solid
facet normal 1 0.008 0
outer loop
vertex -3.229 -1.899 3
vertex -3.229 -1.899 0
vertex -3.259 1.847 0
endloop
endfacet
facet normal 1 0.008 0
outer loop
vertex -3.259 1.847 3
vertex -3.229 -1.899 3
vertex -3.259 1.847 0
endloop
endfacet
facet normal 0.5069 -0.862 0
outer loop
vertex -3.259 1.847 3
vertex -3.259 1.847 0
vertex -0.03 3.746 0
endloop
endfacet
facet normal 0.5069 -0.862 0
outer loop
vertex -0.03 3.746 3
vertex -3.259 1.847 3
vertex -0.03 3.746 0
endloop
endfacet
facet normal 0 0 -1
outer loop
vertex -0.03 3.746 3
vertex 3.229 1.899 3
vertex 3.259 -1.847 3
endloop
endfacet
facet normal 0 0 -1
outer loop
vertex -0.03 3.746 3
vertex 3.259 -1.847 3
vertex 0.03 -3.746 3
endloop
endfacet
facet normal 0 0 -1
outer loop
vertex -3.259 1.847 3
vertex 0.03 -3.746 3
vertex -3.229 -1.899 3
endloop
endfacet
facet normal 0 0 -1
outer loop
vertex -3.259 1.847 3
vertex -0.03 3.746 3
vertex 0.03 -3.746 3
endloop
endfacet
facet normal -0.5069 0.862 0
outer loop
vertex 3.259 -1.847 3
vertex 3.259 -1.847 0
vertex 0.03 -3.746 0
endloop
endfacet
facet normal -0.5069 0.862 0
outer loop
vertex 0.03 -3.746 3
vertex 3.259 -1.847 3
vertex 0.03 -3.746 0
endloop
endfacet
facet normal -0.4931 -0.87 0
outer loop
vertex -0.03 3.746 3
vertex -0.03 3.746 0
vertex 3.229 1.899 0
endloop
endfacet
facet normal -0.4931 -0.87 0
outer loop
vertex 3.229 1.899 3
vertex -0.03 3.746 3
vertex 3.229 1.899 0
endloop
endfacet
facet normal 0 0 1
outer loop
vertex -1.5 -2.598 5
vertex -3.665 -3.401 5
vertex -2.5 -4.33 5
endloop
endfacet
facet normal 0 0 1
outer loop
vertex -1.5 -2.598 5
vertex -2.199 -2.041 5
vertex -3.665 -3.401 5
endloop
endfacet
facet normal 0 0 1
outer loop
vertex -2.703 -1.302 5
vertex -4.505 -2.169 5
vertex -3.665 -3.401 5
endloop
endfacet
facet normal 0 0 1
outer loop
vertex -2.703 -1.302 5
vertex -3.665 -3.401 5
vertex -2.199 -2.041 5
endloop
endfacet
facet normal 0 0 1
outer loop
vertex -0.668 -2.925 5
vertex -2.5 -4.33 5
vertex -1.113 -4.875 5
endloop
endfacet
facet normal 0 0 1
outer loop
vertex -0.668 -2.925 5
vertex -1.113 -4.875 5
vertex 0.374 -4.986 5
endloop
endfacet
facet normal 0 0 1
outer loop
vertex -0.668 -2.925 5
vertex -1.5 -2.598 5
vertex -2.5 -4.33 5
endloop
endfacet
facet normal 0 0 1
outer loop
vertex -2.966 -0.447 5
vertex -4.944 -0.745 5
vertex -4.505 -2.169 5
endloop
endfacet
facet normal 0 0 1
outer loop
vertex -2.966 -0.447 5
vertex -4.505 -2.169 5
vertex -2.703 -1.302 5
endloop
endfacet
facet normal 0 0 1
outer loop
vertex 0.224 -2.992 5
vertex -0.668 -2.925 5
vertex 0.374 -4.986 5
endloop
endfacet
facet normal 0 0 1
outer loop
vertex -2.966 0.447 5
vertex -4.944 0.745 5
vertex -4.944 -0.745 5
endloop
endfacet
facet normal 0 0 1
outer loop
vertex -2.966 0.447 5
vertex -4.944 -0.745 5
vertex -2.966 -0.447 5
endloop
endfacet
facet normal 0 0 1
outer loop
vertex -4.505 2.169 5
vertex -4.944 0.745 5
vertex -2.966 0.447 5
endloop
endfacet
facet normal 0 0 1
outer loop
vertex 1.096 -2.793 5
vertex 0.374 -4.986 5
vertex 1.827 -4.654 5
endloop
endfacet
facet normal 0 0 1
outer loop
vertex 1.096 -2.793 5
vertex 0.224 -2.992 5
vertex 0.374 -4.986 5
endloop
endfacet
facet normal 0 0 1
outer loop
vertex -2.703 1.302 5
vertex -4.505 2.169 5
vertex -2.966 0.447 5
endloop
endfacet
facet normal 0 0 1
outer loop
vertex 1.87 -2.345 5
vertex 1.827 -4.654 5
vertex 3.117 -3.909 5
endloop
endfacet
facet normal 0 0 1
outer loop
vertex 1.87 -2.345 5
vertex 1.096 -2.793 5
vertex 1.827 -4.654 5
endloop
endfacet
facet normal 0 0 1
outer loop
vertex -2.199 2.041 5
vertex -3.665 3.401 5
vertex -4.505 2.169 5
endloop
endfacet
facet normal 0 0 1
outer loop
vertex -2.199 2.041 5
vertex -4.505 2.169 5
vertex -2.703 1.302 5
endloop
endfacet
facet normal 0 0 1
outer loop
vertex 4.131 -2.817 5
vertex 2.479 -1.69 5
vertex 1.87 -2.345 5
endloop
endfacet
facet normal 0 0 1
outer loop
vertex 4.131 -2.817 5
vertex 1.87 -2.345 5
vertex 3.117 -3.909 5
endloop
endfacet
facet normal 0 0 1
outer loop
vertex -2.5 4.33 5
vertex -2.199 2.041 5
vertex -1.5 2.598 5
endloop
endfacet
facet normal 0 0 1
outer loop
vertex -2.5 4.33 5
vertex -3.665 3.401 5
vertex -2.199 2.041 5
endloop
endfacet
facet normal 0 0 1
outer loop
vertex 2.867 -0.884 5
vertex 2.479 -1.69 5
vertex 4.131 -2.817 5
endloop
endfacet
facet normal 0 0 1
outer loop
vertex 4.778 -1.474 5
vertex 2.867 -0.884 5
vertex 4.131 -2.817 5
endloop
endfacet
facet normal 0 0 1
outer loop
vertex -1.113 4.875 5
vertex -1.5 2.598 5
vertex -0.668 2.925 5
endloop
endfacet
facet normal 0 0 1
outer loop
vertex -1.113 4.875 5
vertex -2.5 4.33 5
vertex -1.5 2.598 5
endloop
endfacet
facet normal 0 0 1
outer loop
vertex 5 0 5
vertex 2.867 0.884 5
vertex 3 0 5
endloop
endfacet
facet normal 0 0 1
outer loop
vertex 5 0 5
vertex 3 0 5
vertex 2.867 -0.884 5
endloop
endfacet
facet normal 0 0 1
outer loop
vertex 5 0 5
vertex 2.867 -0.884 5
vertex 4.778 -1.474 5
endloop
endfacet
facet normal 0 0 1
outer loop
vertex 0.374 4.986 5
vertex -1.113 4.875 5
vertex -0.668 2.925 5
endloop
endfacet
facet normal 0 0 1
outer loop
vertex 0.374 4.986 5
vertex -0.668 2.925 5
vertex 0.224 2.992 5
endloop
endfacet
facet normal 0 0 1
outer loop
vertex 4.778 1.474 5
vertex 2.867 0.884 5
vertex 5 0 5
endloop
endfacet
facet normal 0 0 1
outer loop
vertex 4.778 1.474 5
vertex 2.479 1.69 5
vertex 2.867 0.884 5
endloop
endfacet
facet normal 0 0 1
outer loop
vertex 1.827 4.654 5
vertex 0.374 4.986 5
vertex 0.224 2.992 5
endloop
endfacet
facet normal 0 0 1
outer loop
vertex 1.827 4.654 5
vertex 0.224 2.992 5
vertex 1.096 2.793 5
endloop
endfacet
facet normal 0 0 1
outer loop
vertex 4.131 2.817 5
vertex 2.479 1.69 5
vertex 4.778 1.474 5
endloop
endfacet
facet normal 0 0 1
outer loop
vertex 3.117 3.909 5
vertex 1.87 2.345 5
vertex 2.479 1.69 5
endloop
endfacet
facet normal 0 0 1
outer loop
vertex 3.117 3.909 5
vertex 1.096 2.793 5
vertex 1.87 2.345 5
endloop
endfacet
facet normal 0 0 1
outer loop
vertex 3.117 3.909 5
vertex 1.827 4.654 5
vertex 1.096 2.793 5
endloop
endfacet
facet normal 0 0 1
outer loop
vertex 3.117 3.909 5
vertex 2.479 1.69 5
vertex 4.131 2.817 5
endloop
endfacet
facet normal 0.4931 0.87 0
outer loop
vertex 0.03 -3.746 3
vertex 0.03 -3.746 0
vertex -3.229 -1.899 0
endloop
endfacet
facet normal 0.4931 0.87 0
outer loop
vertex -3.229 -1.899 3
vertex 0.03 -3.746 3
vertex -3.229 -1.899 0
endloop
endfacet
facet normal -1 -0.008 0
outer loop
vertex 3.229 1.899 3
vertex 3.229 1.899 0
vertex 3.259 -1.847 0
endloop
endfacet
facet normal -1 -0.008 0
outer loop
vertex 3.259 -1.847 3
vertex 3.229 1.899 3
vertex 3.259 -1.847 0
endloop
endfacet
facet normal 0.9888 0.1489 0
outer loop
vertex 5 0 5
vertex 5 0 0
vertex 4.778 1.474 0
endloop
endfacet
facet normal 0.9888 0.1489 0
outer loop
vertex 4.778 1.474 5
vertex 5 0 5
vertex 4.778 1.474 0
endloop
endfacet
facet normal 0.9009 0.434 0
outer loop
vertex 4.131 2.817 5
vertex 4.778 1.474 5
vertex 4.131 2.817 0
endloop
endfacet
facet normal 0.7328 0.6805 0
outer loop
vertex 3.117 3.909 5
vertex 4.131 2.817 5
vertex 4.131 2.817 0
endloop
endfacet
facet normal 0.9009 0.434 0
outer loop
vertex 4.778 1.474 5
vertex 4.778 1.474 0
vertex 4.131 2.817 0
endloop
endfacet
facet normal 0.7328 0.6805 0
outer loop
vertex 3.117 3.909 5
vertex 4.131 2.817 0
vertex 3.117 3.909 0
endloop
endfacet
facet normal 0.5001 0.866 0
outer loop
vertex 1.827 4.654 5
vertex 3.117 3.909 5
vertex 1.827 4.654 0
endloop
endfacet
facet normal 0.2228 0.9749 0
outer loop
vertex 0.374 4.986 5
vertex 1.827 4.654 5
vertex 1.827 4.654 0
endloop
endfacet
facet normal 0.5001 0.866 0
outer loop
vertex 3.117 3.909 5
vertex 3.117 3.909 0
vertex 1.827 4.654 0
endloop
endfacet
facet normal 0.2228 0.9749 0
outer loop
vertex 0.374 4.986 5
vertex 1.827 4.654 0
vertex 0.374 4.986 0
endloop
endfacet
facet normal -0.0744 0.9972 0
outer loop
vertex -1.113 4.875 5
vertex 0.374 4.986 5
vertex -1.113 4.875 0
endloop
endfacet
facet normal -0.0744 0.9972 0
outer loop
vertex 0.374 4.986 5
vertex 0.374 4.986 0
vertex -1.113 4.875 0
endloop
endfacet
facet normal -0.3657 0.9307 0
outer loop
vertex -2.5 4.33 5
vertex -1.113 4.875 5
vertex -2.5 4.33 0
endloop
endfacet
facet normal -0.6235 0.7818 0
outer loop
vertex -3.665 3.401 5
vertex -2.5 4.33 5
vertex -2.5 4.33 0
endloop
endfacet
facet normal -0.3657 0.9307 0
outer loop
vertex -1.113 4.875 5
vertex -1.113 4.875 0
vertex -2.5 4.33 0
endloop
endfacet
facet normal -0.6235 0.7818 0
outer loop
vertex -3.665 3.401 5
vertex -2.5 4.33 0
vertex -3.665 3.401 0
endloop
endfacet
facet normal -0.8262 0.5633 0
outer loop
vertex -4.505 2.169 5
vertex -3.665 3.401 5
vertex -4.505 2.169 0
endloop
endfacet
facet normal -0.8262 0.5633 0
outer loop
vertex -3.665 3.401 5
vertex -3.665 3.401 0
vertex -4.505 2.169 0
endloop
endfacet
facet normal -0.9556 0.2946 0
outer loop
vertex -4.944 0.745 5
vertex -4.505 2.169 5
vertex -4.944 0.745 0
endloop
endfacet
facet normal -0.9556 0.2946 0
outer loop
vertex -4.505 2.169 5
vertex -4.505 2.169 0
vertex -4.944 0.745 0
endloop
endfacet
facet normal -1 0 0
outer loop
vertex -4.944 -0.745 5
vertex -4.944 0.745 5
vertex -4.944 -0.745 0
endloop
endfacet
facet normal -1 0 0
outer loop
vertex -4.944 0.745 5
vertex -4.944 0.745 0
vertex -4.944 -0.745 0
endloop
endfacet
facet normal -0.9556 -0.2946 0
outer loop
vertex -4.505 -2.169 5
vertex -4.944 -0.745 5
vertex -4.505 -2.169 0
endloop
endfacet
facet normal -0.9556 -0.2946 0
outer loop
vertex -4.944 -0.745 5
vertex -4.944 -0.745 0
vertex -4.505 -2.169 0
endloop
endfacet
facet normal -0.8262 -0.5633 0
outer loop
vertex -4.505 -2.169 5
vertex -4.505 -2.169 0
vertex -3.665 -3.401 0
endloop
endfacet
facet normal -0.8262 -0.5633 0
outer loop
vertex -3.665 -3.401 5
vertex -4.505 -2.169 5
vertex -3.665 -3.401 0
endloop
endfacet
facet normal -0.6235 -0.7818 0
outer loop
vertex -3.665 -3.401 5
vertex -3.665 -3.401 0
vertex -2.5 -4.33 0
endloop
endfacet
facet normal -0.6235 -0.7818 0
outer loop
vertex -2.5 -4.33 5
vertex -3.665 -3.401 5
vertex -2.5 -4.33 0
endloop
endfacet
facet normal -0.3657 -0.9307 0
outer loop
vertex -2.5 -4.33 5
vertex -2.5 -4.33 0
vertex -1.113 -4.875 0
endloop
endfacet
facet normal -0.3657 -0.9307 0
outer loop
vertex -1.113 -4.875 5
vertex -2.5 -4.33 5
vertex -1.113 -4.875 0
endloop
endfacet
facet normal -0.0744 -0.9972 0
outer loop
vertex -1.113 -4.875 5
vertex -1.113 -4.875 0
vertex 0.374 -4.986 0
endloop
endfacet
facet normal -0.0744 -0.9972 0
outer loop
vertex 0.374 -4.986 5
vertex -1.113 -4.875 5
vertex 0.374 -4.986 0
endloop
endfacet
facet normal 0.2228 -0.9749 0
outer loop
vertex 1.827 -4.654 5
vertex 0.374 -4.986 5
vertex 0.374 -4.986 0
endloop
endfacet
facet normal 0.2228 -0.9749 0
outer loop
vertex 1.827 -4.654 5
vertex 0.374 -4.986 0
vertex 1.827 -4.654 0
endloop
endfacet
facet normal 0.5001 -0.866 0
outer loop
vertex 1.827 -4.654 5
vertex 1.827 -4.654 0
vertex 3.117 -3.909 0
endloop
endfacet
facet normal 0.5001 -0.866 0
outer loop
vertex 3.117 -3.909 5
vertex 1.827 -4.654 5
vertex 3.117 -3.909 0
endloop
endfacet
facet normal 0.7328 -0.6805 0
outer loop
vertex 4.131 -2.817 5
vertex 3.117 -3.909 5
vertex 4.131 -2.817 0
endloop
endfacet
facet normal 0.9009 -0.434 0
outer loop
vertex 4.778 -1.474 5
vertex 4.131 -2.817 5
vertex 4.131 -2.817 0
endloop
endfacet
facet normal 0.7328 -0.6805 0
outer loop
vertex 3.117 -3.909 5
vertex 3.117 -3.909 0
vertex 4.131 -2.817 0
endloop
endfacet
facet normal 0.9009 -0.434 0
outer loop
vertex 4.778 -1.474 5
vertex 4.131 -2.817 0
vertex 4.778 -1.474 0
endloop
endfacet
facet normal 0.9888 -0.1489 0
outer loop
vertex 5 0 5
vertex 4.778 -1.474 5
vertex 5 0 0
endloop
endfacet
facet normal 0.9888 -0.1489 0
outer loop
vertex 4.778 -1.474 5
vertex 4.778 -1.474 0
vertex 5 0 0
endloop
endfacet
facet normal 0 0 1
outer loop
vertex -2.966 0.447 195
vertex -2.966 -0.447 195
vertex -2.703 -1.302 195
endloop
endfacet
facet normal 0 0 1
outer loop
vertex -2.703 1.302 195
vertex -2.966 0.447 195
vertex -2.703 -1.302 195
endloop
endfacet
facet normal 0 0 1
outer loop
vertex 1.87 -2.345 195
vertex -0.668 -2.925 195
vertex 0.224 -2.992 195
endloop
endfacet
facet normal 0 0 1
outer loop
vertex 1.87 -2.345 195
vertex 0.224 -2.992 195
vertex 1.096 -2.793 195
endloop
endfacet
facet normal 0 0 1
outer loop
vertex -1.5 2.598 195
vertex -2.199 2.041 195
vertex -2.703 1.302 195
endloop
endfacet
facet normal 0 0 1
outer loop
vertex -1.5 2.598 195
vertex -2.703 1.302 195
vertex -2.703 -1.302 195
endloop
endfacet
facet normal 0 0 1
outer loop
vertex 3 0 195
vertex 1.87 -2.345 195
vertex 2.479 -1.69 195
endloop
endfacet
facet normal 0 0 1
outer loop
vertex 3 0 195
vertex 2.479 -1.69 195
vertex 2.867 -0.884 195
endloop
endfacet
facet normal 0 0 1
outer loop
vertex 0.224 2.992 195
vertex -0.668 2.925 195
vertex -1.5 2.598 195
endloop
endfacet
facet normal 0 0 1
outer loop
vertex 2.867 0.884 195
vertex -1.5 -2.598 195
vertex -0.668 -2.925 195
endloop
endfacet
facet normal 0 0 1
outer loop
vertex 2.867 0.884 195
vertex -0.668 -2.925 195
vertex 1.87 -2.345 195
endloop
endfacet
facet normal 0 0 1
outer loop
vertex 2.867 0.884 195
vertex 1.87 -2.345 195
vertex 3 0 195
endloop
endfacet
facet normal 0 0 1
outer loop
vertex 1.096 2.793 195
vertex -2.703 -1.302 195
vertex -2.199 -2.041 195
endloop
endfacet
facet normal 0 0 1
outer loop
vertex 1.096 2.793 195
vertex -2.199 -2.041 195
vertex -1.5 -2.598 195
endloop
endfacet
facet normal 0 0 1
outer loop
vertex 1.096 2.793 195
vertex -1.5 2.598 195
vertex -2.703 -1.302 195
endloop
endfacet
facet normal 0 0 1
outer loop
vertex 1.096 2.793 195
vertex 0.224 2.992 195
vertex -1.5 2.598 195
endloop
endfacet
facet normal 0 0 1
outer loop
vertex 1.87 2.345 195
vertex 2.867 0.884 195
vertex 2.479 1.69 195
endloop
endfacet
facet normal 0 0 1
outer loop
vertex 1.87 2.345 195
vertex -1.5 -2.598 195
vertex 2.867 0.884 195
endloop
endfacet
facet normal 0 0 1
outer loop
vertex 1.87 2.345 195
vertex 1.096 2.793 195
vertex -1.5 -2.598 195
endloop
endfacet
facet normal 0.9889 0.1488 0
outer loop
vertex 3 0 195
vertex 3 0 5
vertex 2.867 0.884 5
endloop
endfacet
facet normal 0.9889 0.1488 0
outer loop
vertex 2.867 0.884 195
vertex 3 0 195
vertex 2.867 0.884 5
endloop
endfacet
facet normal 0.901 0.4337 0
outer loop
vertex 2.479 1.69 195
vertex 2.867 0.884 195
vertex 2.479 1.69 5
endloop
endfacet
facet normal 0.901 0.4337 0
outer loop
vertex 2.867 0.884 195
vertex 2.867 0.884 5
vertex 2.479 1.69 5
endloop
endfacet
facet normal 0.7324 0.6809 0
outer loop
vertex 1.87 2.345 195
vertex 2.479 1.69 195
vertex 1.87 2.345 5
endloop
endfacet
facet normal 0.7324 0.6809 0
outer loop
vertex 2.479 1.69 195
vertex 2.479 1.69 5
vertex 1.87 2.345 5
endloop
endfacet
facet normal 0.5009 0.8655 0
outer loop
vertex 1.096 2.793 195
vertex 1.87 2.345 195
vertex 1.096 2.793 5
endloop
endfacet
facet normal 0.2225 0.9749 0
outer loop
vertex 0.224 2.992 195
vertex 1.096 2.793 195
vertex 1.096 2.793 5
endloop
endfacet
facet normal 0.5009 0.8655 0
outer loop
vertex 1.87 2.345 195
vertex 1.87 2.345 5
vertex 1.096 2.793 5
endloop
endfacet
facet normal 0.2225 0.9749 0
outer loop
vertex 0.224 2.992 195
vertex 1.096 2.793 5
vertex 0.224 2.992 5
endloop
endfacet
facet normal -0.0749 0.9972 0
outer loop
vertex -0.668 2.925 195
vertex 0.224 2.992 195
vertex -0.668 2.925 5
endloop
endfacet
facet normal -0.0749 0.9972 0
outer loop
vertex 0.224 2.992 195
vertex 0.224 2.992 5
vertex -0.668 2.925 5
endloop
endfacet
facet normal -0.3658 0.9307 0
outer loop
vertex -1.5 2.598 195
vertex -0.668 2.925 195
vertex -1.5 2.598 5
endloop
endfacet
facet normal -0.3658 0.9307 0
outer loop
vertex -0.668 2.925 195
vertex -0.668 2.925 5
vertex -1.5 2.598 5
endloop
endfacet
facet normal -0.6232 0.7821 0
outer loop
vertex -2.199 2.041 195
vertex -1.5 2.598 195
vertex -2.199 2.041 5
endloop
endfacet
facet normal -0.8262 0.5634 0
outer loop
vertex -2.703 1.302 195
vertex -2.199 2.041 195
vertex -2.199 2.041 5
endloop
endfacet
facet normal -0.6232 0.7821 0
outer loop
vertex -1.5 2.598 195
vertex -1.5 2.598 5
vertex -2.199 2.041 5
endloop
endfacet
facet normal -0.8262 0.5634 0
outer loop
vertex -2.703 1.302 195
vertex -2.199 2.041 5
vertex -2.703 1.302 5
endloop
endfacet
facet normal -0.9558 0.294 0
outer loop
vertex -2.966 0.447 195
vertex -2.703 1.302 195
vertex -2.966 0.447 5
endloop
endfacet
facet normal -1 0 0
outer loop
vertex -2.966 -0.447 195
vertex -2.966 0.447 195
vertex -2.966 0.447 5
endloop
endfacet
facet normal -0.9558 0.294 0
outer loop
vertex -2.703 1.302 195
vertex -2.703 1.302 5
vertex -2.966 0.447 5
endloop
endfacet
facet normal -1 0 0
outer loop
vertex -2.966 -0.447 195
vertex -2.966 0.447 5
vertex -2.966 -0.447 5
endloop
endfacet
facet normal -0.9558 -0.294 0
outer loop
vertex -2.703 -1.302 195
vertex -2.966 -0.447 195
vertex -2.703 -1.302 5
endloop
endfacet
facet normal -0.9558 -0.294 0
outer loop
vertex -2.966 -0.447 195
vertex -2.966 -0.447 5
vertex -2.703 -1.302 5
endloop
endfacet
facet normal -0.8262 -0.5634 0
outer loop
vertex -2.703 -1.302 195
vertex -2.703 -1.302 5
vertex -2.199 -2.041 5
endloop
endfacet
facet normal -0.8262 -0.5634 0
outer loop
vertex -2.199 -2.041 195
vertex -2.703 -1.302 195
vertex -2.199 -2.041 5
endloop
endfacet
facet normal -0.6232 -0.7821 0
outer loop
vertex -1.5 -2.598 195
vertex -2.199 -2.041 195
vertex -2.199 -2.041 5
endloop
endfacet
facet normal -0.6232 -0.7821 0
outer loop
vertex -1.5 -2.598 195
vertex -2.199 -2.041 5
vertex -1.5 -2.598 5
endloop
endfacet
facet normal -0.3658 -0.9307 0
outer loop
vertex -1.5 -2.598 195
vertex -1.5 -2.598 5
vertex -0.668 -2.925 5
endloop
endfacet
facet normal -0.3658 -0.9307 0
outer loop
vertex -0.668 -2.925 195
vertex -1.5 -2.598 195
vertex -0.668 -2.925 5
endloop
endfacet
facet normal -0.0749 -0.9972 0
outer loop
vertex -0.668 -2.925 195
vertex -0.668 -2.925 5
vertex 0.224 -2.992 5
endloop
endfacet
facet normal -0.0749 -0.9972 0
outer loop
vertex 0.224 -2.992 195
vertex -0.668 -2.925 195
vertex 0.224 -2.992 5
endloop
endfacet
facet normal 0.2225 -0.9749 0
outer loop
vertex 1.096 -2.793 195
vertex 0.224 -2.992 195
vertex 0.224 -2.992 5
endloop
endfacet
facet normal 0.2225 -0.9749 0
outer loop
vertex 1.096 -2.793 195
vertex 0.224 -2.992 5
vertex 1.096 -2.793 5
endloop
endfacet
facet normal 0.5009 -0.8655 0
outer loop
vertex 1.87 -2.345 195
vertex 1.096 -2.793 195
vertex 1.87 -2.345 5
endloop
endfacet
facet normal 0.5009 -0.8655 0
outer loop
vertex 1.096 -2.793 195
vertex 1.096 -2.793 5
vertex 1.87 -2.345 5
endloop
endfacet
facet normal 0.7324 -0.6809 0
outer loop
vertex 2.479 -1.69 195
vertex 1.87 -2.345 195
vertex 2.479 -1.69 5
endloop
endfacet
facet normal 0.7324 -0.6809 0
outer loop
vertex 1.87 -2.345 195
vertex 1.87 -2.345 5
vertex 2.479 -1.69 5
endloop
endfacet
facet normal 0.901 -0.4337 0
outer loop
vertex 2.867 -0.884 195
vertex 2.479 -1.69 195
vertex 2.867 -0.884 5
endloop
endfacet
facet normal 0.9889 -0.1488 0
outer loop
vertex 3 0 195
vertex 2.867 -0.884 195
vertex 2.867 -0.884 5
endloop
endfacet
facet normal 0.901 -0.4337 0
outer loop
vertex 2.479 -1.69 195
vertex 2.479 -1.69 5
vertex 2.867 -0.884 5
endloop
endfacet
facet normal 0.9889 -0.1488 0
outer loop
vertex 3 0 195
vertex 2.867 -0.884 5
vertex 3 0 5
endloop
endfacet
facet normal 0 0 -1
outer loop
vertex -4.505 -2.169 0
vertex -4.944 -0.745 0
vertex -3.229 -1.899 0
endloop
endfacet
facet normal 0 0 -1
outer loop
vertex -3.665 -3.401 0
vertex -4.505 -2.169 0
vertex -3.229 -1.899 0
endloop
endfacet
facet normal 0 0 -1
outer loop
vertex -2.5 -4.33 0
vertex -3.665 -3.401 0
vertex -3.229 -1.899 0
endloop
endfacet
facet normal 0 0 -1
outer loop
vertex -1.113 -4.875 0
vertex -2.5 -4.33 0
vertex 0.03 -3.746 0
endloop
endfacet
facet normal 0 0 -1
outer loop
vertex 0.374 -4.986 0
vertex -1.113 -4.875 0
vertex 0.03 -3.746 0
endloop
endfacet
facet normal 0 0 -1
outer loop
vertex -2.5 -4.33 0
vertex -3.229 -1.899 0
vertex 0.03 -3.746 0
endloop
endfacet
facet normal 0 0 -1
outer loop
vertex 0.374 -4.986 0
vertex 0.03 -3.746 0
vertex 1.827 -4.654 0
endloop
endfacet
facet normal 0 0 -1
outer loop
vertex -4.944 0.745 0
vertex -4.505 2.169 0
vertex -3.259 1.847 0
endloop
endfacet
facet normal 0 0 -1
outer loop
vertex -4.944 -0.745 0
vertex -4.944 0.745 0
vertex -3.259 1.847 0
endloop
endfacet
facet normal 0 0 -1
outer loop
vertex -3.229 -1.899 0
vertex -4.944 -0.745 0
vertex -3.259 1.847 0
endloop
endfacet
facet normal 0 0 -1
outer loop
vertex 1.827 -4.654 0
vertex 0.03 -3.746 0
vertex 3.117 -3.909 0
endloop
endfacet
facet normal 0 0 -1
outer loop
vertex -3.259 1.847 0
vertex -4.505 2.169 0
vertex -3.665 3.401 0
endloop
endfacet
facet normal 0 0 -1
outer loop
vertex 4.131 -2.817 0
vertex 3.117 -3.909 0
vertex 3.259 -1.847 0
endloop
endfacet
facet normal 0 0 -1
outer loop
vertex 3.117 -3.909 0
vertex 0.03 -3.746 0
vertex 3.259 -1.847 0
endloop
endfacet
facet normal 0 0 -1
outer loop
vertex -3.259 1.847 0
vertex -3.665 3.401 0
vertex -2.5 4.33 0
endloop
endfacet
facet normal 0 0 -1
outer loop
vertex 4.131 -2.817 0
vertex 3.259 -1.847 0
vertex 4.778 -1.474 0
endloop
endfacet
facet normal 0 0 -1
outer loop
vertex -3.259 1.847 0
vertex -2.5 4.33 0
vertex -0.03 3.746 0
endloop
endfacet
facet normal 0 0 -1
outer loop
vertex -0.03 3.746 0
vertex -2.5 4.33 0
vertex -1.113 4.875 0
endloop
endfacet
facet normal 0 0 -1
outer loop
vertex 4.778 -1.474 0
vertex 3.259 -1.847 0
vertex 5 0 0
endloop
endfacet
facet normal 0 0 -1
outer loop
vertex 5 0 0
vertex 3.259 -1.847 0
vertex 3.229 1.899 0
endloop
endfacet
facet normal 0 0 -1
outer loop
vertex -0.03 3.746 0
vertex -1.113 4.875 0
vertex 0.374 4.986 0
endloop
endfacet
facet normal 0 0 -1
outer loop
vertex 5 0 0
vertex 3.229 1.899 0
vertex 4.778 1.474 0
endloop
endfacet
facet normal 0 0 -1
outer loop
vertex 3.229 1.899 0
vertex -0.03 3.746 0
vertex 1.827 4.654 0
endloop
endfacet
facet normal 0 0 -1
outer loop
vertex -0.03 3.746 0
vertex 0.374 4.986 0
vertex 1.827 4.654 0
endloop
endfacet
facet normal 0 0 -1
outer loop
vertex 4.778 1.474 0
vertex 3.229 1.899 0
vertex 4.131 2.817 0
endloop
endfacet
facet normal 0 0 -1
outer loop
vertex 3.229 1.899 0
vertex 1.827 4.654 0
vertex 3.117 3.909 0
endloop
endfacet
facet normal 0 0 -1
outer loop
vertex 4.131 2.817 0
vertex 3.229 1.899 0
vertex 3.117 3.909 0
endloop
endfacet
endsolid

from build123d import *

# Parameters (mm, degrees)
SKETCH2_R           = 5
BOSS_EXTRUDE2_DEPTH = 5
CUT_EXTRUDE2_DEPTH  = 3
SKETCH6_R           = 3
BOSS_EXTRUDE3_DEPTH = 190


with BuildPart() as part:
    # Sketch2 → Boss-Extrude2 (new body)
    with BuildSketch(Plane.XY):
        Circle(SKETCH2_R)
    extrude(amount=BOSS_EXTRUDE2_DEPTH)

    # Sketch5 → Cut-Extrude2 (cut)
    with BuildSketch(Plane(origin=(0, 0, 0), x_dir=(-1, 0, 0), z_dir=(0, 0, -1))):
        Polygon((-3.229126368, 1.898971194), (-3.259120479, -1.847019869), (-0.029994111, -3.745991063), (3.229126368, -1.898971194), (3.259120479, 1.847019869), (0.029994111, 3.745991063), align=None)
    extrude(amount=-CUT_EXTRUDE2_DEPTH, mode=Mode.SUBTRACT)

    # Sketch6 → Boss-Extrude3 (add)
    with BuildSketch(Plane.XY.offset(5)):
        Circle(SKETCH6_R)
    extrude(amount=BOSS_EXTRUDE3_DEPTH)


solid = part.part
